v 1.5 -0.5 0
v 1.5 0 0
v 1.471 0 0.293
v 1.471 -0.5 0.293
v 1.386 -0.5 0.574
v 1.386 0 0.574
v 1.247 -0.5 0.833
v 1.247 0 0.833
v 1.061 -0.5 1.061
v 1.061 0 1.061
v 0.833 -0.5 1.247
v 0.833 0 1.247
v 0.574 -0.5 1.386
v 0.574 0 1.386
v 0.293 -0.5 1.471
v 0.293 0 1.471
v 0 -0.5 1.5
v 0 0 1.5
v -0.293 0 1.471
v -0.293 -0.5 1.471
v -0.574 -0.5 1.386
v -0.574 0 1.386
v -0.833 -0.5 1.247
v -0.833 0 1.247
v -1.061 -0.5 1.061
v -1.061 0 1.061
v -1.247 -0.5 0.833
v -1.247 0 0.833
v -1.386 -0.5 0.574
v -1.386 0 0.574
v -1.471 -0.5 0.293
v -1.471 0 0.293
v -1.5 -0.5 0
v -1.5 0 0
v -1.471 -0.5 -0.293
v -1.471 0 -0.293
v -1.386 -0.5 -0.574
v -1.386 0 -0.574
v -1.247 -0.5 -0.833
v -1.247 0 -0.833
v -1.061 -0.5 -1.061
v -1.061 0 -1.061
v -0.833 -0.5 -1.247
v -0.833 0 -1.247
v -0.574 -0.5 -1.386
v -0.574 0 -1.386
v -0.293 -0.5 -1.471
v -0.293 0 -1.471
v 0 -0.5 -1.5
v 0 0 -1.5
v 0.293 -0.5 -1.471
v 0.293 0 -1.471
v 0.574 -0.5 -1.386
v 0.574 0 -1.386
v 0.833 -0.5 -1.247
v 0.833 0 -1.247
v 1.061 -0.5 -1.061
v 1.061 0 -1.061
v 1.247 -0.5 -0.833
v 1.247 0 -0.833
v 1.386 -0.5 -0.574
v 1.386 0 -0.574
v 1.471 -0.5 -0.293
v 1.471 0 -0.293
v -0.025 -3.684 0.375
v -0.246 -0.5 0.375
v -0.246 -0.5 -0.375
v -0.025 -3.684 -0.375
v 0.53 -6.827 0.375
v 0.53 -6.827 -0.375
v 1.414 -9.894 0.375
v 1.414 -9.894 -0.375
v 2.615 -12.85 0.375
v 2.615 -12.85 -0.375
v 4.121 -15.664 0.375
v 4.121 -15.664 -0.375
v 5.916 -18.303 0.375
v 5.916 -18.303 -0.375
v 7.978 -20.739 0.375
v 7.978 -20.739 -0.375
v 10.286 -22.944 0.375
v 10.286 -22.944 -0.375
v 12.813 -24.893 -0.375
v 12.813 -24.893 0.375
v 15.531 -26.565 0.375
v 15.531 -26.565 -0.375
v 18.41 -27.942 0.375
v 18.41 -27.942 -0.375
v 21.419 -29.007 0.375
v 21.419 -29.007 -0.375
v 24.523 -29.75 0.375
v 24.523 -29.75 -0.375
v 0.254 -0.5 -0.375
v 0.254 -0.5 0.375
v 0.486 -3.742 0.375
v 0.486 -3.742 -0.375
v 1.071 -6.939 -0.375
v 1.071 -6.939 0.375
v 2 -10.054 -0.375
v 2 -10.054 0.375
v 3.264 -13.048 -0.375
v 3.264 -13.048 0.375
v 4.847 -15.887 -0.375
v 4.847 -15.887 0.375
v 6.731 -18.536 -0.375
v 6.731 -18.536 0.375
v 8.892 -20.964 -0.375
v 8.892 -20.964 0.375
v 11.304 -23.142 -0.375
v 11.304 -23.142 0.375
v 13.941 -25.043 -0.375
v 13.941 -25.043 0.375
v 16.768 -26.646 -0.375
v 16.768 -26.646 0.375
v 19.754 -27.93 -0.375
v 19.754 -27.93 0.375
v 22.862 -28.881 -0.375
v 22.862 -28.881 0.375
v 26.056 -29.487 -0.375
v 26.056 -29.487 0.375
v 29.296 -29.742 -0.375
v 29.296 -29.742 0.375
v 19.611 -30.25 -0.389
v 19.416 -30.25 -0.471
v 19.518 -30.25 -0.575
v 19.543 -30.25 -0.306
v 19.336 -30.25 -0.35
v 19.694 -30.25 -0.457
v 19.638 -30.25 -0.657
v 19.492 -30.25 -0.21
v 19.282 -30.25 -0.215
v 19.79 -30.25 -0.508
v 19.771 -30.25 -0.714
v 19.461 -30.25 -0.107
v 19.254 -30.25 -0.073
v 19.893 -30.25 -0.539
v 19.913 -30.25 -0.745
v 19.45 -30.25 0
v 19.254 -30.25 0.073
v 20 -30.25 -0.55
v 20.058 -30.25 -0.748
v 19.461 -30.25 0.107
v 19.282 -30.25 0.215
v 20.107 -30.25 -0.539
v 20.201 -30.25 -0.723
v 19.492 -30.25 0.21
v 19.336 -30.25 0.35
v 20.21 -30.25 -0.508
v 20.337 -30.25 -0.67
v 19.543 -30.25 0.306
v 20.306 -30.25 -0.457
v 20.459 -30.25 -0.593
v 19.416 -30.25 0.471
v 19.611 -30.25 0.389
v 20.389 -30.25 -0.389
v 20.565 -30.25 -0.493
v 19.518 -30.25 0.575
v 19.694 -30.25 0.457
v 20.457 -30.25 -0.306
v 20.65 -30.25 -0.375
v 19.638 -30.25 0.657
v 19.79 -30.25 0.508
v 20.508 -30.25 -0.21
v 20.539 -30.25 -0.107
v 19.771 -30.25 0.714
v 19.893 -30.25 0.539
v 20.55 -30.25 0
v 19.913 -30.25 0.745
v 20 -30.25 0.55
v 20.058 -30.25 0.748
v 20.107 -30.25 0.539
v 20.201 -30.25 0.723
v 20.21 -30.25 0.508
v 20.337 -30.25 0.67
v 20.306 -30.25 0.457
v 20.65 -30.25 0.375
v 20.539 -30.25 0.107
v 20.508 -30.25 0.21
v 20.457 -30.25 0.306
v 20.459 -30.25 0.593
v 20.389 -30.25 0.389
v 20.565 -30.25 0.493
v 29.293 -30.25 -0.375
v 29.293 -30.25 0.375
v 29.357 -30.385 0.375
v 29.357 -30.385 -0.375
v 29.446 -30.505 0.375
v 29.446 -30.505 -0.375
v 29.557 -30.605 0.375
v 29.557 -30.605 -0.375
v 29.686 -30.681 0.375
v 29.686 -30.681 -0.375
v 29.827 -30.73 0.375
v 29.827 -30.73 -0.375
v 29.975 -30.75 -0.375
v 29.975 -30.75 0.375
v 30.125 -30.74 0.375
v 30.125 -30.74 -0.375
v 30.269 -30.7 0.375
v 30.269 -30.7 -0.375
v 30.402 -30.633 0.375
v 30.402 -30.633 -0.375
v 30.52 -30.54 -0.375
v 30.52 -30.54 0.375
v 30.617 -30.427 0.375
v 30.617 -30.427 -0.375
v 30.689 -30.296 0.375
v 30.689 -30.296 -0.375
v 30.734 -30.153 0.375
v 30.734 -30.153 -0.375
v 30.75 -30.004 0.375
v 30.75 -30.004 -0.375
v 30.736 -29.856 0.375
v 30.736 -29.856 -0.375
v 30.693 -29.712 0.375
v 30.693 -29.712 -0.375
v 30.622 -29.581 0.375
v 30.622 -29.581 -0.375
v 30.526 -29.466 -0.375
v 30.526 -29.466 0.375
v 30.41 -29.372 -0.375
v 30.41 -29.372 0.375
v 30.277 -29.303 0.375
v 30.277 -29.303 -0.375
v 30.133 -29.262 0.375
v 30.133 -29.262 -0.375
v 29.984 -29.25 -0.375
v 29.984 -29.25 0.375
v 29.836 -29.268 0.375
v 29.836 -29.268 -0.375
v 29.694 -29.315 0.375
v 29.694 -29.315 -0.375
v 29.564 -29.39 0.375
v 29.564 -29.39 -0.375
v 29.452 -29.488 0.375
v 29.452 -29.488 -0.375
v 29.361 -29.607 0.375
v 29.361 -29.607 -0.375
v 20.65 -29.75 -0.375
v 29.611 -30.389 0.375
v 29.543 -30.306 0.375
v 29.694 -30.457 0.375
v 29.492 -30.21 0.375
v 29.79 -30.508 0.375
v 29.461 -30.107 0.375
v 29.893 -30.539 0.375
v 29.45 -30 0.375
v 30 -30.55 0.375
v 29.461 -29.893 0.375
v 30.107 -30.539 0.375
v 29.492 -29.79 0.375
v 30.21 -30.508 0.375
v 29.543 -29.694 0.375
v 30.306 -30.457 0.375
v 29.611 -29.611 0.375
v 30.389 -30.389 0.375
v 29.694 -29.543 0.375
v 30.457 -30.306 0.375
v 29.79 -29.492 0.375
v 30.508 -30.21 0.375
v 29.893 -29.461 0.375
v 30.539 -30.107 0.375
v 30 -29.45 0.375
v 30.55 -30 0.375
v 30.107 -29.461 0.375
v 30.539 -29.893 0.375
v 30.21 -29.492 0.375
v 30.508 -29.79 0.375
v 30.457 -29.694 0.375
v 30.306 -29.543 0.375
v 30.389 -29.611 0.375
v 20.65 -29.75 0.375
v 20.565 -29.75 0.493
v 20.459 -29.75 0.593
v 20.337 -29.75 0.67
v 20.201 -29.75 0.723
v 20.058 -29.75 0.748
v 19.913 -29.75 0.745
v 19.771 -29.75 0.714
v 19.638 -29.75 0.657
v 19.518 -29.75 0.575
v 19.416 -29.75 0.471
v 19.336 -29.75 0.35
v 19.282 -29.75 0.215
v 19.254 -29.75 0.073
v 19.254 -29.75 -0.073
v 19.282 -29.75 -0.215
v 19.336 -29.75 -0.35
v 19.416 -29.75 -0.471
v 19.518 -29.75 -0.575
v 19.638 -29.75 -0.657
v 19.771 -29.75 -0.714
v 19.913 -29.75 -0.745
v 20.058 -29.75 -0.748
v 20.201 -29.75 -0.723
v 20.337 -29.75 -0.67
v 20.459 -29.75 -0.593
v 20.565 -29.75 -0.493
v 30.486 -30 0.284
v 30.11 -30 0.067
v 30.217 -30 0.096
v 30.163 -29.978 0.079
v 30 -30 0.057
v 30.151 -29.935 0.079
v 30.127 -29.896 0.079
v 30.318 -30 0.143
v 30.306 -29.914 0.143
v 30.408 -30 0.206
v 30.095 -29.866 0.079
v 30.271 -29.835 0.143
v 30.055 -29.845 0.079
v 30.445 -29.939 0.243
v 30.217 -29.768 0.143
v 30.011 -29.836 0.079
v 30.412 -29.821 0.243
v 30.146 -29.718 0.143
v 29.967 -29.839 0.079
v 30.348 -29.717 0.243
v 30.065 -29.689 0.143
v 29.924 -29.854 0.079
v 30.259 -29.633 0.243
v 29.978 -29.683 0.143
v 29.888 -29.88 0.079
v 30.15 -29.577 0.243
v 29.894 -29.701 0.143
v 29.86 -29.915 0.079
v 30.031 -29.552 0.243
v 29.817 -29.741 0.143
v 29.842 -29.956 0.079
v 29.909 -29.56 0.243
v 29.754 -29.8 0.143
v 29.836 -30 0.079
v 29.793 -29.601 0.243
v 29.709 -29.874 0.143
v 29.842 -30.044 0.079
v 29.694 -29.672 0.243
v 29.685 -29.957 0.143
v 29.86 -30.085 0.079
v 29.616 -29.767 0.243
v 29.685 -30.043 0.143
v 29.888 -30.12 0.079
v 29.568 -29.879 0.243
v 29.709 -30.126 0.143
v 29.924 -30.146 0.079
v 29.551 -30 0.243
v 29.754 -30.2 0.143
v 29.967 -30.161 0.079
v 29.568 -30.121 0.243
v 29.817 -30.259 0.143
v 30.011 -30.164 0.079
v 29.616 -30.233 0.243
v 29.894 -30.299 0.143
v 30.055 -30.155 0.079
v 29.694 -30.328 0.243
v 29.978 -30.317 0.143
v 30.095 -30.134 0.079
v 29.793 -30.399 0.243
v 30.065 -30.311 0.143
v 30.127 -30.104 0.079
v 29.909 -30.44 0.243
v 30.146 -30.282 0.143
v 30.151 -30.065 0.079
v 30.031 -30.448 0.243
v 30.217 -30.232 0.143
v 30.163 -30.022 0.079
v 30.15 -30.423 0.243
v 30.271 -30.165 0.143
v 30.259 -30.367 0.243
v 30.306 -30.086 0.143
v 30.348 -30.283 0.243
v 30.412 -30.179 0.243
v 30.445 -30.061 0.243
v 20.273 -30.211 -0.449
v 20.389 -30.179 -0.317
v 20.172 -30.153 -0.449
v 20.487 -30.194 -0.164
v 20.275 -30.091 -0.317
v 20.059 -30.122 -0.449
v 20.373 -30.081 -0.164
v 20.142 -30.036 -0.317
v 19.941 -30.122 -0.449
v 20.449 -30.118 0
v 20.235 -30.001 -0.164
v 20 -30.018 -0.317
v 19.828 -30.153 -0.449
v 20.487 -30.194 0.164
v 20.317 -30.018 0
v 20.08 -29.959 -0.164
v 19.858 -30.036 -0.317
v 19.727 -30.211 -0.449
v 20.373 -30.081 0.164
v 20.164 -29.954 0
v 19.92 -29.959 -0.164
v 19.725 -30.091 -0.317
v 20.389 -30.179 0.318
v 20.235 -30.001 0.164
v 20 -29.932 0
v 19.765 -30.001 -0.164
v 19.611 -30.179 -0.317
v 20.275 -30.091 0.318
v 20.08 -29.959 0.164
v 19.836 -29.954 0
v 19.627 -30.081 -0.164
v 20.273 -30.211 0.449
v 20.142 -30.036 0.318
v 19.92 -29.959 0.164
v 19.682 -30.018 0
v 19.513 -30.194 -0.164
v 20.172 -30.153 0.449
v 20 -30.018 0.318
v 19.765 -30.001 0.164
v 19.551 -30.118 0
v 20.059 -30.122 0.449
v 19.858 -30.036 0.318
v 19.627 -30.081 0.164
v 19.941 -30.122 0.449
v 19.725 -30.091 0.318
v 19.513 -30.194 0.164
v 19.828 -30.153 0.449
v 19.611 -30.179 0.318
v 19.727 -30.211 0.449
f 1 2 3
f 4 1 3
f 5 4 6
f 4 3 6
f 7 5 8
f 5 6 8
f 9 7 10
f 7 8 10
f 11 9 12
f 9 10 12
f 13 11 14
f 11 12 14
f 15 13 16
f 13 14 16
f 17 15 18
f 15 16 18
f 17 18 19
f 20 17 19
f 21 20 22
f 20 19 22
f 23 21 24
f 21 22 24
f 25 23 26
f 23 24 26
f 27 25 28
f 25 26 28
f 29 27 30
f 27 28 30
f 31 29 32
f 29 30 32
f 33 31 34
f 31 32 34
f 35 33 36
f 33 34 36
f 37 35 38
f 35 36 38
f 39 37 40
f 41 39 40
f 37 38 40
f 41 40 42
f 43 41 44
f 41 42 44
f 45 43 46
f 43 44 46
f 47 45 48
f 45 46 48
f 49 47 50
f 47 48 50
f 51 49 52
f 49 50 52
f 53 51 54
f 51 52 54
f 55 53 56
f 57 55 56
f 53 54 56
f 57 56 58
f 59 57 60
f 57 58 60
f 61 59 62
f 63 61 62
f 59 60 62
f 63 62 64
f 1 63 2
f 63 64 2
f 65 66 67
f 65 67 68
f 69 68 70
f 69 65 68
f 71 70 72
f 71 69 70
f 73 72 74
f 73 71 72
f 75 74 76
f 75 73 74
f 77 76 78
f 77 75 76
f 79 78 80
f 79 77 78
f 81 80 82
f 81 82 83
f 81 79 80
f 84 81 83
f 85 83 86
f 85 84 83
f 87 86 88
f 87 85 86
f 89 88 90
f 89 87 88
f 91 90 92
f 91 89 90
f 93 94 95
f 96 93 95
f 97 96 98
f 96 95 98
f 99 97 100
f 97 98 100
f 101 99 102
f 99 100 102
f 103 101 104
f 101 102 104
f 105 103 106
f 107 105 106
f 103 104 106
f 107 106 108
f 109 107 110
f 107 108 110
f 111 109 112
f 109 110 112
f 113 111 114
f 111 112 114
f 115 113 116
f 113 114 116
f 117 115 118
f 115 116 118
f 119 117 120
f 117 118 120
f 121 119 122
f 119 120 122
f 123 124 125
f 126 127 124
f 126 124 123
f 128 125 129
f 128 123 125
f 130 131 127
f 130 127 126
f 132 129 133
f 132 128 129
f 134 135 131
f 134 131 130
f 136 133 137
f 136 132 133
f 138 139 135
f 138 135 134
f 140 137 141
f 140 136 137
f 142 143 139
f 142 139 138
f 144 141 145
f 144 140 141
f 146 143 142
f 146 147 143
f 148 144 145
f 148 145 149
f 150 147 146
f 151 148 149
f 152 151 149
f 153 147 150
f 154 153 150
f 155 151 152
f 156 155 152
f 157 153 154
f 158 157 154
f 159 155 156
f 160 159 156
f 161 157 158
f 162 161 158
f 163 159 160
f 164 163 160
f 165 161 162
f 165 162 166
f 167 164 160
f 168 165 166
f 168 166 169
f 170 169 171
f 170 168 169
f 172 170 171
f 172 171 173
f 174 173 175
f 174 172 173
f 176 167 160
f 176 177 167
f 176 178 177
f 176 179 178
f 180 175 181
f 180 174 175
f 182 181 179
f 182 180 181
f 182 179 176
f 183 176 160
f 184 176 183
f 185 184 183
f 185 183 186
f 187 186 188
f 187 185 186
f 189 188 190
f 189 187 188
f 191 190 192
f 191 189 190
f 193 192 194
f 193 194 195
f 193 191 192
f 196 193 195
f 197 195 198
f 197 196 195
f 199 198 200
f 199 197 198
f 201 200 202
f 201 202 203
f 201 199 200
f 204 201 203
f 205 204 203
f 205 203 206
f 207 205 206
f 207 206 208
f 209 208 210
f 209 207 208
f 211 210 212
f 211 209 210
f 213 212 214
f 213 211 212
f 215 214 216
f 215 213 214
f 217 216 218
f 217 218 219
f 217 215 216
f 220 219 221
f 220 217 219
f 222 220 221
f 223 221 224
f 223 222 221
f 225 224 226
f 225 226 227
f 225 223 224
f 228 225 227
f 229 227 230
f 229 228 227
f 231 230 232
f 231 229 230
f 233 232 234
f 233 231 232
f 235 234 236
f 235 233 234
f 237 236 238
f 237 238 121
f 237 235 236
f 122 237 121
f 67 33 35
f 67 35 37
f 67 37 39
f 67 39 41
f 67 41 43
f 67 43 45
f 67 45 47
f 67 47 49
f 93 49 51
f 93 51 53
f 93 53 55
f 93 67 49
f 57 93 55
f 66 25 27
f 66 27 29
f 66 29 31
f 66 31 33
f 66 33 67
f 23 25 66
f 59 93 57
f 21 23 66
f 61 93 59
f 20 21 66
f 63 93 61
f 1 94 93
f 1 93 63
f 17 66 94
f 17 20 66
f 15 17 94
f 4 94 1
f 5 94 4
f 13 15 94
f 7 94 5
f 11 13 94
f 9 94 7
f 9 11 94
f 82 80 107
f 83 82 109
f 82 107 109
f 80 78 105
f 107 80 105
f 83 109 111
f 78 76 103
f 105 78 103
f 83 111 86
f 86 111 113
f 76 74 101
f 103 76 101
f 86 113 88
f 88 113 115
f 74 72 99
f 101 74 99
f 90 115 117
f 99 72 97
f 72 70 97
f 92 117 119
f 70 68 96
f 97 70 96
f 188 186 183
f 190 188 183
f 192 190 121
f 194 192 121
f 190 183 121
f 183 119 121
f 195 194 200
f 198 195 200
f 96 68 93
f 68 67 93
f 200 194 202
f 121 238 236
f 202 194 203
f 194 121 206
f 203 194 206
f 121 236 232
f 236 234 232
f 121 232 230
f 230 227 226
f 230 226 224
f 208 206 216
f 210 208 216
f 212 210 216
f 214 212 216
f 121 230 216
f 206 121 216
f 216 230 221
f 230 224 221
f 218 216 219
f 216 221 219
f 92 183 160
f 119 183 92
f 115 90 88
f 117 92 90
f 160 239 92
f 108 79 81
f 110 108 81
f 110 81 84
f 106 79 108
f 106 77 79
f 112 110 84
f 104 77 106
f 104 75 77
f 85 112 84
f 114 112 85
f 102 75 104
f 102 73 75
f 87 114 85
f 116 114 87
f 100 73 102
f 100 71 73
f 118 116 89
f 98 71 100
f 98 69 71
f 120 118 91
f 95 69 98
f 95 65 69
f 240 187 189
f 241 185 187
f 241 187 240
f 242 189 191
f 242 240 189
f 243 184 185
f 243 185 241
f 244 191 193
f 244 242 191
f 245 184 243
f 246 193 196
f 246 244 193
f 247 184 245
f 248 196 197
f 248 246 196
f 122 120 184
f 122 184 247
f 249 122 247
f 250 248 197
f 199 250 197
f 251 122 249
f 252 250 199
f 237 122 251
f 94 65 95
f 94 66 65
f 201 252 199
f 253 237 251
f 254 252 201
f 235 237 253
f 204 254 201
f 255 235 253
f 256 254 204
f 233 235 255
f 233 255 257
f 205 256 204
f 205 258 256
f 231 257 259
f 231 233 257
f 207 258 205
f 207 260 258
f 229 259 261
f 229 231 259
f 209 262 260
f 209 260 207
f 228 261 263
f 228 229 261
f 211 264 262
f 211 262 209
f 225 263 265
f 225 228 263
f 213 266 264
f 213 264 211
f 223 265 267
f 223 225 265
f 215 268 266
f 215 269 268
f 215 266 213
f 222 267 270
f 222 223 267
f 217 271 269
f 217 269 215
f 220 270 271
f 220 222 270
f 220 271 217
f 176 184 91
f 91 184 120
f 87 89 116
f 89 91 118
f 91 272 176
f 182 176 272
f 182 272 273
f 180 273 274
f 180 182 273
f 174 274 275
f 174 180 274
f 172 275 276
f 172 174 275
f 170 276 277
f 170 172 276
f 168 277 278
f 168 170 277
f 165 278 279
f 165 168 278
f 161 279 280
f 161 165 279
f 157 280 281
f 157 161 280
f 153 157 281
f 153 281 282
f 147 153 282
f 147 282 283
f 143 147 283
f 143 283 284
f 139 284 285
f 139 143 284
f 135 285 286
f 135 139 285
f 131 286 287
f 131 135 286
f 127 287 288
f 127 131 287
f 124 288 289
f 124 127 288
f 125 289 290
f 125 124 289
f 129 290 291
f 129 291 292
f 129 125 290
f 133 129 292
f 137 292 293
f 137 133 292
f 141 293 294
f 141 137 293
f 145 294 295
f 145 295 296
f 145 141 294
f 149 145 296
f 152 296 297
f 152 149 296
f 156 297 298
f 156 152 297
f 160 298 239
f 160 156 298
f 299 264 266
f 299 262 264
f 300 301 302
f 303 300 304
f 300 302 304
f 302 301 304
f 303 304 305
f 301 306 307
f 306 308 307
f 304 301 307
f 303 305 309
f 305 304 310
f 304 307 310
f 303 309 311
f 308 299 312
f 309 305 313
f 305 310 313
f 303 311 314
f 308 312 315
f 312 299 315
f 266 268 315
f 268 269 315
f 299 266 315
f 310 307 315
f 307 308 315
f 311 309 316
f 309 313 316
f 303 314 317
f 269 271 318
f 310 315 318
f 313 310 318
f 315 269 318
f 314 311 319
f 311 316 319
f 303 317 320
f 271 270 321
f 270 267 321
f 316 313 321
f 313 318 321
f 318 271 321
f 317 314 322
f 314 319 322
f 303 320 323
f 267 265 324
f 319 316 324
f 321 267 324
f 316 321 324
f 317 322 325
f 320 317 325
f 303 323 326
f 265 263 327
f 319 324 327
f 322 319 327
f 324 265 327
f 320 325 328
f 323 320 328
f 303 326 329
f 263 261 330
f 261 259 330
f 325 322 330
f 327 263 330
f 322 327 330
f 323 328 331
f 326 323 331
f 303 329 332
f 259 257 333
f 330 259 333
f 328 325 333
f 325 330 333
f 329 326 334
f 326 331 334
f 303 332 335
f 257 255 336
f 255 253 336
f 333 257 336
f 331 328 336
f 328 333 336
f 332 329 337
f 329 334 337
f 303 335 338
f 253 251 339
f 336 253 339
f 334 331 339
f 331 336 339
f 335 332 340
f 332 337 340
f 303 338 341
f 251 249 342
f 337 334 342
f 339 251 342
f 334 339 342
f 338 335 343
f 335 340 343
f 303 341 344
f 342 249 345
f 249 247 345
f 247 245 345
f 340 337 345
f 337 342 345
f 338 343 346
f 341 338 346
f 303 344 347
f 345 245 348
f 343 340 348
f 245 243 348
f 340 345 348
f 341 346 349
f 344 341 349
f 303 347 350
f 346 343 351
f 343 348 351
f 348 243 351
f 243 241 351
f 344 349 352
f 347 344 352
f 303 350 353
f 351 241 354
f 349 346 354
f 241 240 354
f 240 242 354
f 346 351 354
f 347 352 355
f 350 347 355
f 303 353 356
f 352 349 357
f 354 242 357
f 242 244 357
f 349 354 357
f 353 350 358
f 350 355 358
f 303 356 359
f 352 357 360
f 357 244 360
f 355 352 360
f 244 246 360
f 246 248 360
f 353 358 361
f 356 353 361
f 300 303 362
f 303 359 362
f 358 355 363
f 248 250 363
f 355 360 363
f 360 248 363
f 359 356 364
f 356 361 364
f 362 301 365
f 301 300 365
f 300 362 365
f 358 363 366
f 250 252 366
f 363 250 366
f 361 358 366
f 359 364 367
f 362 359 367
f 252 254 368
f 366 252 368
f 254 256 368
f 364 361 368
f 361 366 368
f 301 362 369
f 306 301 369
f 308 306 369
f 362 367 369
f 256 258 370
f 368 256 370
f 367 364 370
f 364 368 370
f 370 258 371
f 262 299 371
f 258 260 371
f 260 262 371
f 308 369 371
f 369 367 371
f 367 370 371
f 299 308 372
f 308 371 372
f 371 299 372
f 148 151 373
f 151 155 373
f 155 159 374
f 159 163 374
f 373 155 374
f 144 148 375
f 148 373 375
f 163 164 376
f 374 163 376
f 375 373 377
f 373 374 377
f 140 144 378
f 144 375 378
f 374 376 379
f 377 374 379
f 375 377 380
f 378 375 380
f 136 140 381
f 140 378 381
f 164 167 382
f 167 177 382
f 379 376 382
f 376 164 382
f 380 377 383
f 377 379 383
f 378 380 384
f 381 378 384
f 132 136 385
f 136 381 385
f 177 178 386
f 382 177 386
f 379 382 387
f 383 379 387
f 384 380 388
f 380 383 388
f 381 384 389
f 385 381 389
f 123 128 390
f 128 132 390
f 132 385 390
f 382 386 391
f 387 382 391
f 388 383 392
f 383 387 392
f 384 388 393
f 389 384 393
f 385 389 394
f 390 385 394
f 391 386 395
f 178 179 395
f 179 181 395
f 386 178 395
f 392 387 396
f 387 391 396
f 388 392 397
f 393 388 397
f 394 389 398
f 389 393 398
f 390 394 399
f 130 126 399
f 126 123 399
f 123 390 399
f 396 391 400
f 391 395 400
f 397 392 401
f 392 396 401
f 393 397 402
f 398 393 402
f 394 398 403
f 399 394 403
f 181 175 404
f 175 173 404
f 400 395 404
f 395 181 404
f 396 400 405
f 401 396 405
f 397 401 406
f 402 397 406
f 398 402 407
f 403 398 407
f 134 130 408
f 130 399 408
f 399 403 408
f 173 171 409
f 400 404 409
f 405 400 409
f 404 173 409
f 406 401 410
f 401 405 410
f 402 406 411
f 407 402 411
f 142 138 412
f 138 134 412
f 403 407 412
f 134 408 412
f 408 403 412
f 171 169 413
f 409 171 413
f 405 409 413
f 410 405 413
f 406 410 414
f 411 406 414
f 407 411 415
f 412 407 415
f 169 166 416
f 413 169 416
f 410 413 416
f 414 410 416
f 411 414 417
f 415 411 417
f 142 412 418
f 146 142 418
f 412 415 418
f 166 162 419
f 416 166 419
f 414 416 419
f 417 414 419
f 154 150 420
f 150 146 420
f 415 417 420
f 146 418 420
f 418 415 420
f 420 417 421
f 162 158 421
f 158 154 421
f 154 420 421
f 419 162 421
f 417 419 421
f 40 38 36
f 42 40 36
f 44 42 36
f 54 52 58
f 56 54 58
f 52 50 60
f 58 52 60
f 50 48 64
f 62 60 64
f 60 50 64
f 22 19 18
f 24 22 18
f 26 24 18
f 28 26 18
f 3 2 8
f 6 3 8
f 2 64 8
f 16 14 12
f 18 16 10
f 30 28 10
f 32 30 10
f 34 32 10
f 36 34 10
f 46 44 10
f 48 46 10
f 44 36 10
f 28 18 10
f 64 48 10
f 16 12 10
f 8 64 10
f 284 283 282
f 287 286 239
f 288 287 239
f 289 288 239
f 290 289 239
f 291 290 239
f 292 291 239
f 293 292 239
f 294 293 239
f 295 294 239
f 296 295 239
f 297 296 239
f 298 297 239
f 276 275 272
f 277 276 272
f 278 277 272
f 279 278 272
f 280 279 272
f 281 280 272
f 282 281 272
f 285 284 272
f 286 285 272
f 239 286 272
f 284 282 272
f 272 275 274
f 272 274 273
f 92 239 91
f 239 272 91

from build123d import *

# Parameters (mm, degrees)
PAD_DEPTH    = 0.375
SKETCH002_R  = 1.5
PAD001_DEPTH = 0.5
SKETCH003_W  = 10
SKETCH003_H  = 0.5
PAD002_DEPTH = 0.375
SKETCH004_R  = 0.75
PAD003_DEPTH = 0.25


with BuildPart() as part:
    # Sketch → Pad (new body, symmetric)
    with BuildSketch(Plane.XY):
        with BuildLine():
            Line((-0.25, 0), (0, 0))
            Line((0, 0), (0.25, 0))
            ThreePointArc((0.25, 0), (8.71609, -20.785997), (29.295895, -29.741667))
            ThreePointArc((29.290002, -30.241667), (30.749948, -30.008839), (29.295895, -29.741667))
            ThreePointArc((-0.25, 0), (8.360454, -21.137467), (29.290002, -30.241667))
        make_face()
    extrude(amount=PAD_DEPTH, both=True)

    # Sketch002 → Pad001 (join)
    with BuildSketch(Plane.XZ):
        Circle(SKETCH002_R)
    extrude(amount=PAD001_DEPTH)

    # Sketch003 → Pad002 (join, symmetric)
    with BuildSketch(Plane.XY):
        with Locations((25, -30)):
            Rectangle(SKETCH003_W, SKETCH003_H)
    extrude(amount=PAD002_DEPTH, both=True)

    # Sphere → Sphere (revolve, cut)
    with BuildSketch(Plane(origin=(30, -30, 0.6925), x_dir=(1, 0, 0), z_dir=(0, -1, 0))):
        with BuildLine():
            ThreePointArc((0, -0.635), (0.635, 0), (0, 0.635))
            Line((0, 0.635), (0, -0.635))
        make_face()
    revolve(axis=Axis((30, -30, 0.6925), (0, 0, 1)), mode=Mode.SUBTRACT)

    # Sketch004 (on DatumPlane) → Pad003 (join, symmetric)
    with BuildSketch(Plane(origin=(20, -30, 0), x_dir=(1, 0, 0), z_dir=(0, -1, 0))):
        Circle(SKETCH004_R)
    extrude(amount=PAD003_DEPTH, both=True)

    # Sphere001 → Sphere001 (revolve, cut)
    with BuildSketch(Plane(origin=(20, -30.5675, 0), x_dir=(1, 0, 0), z_dir=(0, -1, 0))):
        with BuildLine():
            ThreePointArc((0, -0.635), (0.635, 0), (0, 0.635))
            Line((0, 0.635), (0, -0.635))
        make_face()
    revolve(axis=Axis((20, -30.5675, 0), (0, 0, 1)), mode=Mode.SUBTRACT)


solid = part.part
